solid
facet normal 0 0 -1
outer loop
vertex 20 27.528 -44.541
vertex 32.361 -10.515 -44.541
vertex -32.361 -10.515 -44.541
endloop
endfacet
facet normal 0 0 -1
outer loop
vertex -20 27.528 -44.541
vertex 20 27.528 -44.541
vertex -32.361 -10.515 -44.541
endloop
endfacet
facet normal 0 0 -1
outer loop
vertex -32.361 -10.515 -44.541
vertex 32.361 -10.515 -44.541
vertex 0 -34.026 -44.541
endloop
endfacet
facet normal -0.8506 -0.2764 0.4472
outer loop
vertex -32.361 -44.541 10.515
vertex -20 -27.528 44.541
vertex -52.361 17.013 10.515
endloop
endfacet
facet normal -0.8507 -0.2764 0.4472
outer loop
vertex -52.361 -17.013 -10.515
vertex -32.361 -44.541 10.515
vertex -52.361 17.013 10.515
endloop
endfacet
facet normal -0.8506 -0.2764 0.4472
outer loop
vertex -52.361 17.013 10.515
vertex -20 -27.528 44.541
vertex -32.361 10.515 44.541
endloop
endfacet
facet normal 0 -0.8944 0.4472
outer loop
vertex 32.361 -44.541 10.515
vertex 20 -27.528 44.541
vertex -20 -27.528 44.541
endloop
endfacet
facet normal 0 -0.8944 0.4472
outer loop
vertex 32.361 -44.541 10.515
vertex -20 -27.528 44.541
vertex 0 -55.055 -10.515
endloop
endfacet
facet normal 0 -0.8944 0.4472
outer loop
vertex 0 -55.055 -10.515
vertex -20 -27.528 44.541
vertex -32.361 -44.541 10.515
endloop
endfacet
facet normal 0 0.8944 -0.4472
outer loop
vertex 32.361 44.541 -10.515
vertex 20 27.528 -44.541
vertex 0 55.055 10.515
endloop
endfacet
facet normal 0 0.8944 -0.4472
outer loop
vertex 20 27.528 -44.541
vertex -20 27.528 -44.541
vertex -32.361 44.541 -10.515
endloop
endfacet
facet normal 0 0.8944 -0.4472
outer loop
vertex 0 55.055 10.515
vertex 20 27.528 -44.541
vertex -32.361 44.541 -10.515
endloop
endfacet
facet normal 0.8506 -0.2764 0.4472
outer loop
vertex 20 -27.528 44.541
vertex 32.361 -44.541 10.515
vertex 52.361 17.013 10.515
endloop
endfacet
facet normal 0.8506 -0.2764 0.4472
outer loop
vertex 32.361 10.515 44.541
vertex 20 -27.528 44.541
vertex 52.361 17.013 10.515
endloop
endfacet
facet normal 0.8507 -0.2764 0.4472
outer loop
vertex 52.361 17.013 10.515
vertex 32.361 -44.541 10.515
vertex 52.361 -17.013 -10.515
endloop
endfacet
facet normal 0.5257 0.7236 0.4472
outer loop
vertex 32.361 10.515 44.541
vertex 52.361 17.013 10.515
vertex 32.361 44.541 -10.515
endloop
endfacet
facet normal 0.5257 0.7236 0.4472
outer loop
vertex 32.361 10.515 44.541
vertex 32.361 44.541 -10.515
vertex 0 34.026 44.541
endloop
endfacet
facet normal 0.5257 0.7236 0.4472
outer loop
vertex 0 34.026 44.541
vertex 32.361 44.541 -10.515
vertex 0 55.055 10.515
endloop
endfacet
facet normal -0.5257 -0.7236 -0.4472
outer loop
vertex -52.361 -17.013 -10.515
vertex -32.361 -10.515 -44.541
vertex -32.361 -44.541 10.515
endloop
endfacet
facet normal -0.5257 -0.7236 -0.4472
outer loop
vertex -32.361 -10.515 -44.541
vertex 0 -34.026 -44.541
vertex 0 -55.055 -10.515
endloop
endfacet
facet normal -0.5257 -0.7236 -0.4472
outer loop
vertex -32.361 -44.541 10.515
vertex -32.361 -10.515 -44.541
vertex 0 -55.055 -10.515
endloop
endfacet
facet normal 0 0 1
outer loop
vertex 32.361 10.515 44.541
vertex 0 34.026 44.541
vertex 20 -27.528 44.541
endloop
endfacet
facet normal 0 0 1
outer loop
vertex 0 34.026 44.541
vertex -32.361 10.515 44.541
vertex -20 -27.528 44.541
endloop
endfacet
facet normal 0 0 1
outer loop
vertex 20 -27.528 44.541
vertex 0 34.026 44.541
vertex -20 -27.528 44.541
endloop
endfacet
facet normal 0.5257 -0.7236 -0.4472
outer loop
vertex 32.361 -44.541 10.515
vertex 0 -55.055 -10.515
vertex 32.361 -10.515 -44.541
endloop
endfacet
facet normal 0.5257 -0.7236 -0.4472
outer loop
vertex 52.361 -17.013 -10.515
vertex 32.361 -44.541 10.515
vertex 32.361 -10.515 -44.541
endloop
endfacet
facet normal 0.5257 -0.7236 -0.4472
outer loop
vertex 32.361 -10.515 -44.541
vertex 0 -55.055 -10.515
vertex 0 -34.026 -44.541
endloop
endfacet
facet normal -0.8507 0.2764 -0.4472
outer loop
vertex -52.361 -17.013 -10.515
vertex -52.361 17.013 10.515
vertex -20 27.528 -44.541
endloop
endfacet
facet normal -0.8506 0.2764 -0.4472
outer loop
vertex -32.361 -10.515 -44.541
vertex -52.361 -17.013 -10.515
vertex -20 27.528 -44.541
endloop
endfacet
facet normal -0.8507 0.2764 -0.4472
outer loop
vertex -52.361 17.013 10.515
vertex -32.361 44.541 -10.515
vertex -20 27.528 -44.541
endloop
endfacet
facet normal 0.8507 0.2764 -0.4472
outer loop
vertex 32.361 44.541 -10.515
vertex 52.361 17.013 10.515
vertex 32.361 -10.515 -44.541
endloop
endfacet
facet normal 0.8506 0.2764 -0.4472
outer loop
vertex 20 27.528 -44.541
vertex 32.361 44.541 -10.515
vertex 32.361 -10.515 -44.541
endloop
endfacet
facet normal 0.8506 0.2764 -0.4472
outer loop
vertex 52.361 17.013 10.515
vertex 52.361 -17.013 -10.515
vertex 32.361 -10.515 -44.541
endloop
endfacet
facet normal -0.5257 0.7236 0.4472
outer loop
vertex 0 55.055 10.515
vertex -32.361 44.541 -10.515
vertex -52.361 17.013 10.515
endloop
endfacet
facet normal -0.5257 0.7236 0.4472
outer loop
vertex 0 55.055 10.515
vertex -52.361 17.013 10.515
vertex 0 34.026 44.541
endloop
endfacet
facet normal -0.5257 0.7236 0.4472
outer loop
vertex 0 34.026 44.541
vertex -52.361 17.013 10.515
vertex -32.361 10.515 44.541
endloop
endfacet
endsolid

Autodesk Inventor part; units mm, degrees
ref_plane "YZ Plane" through (0, 0, 0) normal (1, 0, 0) x (0, 1, 0)
ref_plane "XZ Plane" through (0, 0, 0) normal (0, 1, 0) x (-1, 0, 0)
ref_plane "Work Plane1" through (0, 0, 44.5407) normal (0, 0, 1) x (1, 0, 0)
sketch "Sketch2" plane through (0, 0, 44.5407) normal (0, 0, 1) x (1, 0, 0)
  line L0 (0, 34.026) -> (32.3607, 10.5146)
  line L1 (32.3607, 10.5146) -> (20, -27.5276)
  line L2 (20, -27.5276) -> (-20, -27.5276)
  line L3 (-20, -27.5276) -> (-32.3607, 10.5146)
  line L4 (-32.3607, 10.5146) -> (0, 34.026)
  point P0 (0, 0)
  point P1 (0, 0)
  dimension "d2" = 40
loft "Loft1" add profiles "Sketch2" section 2 point at (0, 0, 0)
mirror "Mirror1" about plane through (32.3607, 10.5146, 44.5407) normal (0.809017, -0.2628656, -0.5257311) of "Loft1"
mirror "Mirror2" about plane through (20, -27.5276, 44.5407) normal (0, -0.8506508, -0.5257311) of "Loft1"
mirror "Mirror3" about plane through (-20, -27.5276, 44.5407) normal (-0.809017, -0.2628656, -0.5257311) of "Loft1"
mirror "Mirror4" about plane through (-32.3607, 10.5146, 44.5407) normal (-0.5, 0.688191, -0.5257311) of "Loft1"
mirror "Mirror5" about plane through (0, 34.026, 44.5407) normal (0.5, 0.688191, -0.5257311) of "Loft1"
mirror "Mirror6" about plane through (-52.3607, -17.013, -10.5146) normal (0.309017, -0.4253254, -0.8506508) of "Loft1", "Mirror3"
mirror "Mirror7" about plane through (-52.3607, 17.013, 10.5146) normal (0, 0.5257311, -0.8506508) of "Loft1", "Mirror3"
mirror "Mirror8" about plane through (52.3607, -17.013, -10.5146) normal (0, 0.5257311, -0.8506508) of "Loft1", "Mirror1"
mirror "Mirror9" about plane through (20, 27.5276, -44.5407) normal (-0.809017, -0.2628656, -0.5257311) of "Loft1", "Mirror1", "Mirror8"
properties part number "dodecahedron"
